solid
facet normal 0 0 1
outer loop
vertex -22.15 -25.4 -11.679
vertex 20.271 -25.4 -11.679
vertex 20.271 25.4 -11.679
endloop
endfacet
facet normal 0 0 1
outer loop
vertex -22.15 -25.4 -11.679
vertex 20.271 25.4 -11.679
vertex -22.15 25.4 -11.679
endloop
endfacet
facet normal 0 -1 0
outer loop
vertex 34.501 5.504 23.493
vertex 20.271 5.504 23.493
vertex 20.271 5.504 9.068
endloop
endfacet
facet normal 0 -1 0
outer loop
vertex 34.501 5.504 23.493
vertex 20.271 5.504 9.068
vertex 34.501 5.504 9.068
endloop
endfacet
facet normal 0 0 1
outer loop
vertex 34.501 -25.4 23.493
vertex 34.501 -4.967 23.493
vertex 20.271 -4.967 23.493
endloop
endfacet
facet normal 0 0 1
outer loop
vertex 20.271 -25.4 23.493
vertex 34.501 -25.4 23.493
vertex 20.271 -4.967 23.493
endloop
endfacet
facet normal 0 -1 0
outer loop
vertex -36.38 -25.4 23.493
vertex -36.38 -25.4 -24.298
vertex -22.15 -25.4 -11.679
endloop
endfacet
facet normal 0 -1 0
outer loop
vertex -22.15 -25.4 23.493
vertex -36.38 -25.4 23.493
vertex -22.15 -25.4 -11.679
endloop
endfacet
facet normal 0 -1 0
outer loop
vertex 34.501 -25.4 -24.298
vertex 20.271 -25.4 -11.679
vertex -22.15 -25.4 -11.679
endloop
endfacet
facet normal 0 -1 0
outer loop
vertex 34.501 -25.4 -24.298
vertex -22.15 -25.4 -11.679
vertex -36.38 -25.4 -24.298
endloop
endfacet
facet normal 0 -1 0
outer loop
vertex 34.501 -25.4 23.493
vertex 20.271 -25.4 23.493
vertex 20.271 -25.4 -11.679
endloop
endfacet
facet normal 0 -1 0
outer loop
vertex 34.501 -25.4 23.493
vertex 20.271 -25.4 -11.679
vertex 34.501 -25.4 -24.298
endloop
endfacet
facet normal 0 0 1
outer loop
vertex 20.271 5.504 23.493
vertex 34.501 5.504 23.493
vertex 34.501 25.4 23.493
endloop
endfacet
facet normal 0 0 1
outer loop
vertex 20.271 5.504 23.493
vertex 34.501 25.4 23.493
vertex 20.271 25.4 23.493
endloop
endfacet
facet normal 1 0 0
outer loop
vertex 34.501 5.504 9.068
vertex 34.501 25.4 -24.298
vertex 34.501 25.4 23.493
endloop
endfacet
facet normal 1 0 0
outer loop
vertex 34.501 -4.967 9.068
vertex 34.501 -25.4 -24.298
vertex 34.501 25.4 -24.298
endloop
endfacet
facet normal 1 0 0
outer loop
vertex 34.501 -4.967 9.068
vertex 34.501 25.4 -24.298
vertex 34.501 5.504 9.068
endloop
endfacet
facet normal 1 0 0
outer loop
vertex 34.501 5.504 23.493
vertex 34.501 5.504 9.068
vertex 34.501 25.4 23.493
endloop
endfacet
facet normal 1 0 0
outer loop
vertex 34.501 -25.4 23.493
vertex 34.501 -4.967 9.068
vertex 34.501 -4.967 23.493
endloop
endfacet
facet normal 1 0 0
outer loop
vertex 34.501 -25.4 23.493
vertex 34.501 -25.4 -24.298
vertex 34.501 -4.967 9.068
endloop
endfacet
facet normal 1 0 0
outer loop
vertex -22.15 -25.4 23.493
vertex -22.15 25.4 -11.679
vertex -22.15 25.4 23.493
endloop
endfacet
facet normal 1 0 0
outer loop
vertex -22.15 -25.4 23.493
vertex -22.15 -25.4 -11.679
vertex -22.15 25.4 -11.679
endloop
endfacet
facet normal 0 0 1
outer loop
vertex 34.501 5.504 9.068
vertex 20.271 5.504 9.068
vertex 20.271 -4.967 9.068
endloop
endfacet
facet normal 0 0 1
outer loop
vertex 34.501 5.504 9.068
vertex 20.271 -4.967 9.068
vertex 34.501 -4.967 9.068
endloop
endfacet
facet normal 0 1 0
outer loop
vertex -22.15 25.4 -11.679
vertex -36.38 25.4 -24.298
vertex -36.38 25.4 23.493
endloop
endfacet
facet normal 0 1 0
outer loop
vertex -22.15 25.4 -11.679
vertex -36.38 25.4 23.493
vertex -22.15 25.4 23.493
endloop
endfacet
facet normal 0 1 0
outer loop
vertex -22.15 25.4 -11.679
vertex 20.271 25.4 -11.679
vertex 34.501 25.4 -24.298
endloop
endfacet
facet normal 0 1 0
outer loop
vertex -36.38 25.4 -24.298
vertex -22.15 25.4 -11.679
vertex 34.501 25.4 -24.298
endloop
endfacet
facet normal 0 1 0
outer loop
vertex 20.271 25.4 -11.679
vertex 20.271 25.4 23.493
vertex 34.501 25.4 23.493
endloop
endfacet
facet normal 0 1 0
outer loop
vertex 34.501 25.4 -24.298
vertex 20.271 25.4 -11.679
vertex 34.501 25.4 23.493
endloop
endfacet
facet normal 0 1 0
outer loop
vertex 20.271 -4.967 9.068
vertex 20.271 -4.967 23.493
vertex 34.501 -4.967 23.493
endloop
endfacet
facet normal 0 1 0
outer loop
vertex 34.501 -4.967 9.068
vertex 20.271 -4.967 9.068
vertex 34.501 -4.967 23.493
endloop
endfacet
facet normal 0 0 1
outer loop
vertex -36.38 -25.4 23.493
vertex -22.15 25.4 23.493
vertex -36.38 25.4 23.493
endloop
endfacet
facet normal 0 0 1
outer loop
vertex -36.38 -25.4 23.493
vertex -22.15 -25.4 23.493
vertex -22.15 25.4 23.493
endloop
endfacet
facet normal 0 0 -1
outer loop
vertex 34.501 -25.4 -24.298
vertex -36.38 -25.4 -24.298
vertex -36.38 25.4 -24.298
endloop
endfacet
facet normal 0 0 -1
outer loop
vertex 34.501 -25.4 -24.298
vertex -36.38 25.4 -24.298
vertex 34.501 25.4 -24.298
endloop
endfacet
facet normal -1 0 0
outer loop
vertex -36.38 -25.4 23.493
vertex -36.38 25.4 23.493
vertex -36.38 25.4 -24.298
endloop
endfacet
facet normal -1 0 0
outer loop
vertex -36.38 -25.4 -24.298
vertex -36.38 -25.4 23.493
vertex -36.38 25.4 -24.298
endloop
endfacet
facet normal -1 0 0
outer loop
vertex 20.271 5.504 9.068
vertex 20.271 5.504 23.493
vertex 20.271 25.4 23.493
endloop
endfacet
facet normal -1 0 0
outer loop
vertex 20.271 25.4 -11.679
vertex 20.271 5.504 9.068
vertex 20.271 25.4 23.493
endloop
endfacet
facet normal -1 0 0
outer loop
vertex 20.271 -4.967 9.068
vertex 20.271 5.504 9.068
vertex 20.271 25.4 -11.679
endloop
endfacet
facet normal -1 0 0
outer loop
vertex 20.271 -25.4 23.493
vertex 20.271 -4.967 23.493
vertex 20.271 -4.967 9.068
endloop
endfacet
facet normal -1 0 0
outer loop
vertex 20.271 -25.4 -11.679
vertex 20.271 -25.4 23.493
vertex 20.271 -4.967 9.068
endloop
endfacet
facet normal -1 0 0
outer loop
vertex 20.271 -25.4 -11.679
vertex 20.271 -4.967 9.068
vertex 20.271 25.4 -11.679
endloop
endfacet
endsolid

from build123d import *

# Parameters (mm, degrees)
F1_DEPTH = 25.4
F2_W     = 14.229968
F2_H     = 10.471108
F3_DEPTH = 14.424406


with BuildPart() as f1:
    # F0 (on Front) → F1 (new body, symmetric)
    with BuildSketch(Plane.XZ):
        Polygon((-36.380388, 23.492869), (-36.380388, -24.298338), (34.500958, -24.298338), (34.500958, 23.492869), (20.27099, 23.492869), (20.27099, -11.679313), (-22.15042, -11.679313), (-22.15042, 23.492869), align=None)
    extrude(amount=F1_DEPTH, both=True)

    # F2 (on face) → F3 (cut)
    with BuildSketch(Plane.XY.offset(23.492869)):
        with Locations((27.385974, 0.26849)):
            Rectangle(F2_W, F2_H)
    extrude(amount=-F3_DEPTH, mode=Mode.SUBTRACT)


solid = f1.part
